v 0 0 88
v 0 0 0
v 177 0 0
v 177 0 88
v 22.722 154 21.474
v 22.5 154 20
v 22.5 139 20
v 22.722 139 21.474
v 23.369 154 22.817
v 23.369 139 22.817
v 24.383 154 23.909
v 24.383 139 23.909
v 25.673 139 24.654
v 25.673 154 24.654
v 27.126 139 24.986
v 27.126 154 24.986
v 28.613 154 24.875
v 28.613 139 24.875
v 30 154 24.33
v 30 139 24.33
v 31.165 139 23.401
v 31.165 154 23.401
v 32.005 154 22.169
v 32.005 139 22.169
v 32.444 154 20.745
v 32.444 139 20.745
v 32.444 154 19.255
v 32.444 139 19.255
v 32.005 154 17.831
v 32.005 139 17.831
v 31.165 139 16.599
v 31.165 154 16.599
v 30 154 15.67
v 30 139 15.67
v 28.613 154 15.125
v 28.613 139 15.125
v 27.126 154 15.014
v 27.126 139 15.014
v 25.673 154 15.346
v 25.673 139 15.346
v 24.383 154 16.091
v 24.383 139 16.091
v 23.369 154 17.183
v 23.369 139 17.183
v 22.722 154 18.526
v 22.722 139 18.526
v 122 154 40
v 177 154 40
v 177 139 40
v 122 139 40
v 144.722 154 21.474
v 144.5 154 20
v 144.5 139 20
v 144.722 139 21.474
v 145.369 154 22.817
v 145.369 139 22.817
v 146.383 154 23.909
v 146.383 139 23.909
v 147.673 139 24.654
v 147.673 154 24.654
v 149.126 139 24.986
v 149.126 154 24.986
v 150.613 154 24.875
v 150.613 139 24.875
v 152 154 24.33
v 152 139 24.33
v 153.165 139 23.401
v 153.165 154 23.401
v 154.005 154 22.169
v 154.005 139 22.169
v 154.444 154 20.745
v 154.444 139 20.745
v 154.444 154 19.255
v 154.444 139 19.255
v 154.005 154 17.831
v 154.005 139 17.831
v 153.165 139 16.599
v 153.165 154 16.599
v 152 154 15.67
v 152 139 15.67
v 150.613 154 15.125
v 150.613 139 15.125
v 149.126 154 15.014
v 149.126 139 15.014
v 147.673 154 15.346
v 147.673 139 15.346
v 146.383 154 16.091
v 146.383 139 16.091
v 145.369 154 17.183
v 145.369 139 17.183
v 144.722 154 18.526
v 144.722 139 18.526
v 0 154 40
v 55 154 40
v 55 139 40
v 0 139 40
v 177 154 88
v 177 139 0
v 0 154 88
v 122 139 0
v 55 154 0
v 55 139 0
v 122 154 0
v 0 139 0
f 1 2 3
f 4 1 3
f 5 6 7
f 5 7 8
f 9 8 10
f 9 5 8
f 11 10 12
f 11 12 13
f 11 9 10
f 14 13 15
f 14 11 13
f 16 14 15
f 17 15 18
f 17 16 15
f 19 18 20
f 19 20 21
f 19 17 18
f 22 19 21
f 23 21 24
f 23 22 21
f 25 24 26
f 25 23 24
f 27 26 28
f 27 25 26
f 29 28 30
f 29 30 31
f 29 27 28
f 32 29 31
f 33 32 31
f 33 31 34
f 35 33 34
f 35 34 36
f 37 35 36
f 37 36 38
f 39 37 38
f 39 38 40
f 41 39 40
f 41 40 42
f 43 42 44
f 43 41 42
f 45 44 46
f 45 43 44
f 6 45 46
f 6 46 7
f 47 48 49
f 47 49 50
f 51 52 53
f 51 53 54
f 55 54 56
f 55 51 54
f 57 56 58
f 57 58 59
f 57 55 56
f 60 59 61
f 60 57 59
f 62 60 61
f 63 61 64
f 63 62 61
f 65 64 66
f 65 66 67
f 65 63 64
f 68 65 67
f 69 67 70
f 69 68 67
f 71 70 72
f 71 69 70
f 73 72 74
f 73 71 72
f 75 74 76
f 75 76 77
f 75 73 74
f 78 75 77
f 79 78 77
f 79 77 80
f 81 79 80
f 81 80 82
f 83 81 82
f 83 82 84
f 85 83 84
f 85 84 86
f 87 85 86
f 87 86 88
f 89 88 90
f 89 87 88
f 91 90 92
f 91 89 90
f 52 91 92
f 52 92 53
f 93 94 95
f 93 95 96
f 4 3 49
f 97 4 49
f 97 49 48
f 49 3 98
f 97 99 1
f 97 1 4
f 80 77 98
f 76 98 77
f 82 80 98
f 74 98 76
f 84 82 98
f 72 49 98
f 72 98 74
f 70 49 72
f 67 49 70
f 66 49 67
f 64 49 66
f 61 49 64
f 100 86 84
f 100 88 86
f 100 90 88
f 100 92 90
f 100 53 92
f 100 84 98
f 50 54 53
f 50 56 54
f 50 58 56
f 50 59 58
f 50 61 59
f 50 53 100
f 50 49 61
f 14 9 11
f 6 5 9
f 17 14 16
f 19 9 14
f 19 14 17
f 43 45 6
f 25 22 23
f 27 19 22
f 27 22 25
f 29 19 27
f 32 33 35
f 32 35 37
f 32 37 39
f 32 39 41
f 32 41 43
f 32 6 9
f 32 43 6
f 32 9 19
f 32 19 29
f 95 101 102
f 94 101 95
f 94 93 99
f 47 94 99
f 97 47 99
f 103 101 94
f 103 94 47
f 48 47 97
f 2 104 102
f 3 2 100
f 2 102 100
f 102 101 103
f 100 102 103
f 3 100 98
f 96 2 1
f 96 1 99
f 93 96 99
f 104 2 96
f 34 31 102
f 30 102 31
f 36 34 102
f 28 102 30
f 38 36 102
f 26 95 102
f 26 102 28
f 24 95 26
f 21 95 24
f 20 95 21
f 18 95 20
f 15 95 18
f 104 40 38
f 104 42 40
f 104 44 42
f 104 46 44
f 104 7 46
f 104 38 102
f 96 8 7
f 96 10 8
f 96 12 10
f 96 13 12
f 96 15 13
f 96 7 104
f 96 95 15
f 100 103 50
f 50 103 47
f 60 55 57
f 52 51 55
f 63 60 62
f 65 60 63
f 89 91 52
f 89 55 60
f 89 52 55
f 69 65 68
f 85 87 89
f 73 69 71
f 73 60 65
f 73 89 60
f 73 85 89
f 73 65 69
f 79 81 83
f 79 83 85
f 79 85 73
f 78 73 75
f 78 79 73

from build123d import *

# Parameters (mm, degrees)
F0_W     = 177
F0_H     = 154
F1_DEPTH = 88
F2_W     = 55
F2_H     = 40
F2_R     = 5
F3_DEPTH = 15


with BuildPart() as f1:
    # F0 (on Top) → F1 (new body)
    with BuildSketch(Plane.XY):
        with Locations((88.5, 77)):
            Rectangle(F0_W, F0_H)
    extrude(amount=F1_DEPTH)

    # F2 (on face) → F3 (cut)
    with BuildSketch(Plane(origin=(0, 154, 0), x_dir=(-1, 0, 0), z_dir=(0, 1, 0))):
        with Locations((-149.5, 20)):
            Rectangle(F2_W, F2_H)
        with Locations((-149.5, 20)):
            Circle(F2_R, mode=Mode.SUBTRACT)
        with Locations((-27.5, 20)):
            Rectangle(F2_W, F2_H)
        with Locations((-27.5, 20)):
            Circle(F2_R, mode=Mode.SUBTRACT)
    extrude(amount=-F3_DEPTH, mode=Mode.SUBTRACT)


solid = f1.part
